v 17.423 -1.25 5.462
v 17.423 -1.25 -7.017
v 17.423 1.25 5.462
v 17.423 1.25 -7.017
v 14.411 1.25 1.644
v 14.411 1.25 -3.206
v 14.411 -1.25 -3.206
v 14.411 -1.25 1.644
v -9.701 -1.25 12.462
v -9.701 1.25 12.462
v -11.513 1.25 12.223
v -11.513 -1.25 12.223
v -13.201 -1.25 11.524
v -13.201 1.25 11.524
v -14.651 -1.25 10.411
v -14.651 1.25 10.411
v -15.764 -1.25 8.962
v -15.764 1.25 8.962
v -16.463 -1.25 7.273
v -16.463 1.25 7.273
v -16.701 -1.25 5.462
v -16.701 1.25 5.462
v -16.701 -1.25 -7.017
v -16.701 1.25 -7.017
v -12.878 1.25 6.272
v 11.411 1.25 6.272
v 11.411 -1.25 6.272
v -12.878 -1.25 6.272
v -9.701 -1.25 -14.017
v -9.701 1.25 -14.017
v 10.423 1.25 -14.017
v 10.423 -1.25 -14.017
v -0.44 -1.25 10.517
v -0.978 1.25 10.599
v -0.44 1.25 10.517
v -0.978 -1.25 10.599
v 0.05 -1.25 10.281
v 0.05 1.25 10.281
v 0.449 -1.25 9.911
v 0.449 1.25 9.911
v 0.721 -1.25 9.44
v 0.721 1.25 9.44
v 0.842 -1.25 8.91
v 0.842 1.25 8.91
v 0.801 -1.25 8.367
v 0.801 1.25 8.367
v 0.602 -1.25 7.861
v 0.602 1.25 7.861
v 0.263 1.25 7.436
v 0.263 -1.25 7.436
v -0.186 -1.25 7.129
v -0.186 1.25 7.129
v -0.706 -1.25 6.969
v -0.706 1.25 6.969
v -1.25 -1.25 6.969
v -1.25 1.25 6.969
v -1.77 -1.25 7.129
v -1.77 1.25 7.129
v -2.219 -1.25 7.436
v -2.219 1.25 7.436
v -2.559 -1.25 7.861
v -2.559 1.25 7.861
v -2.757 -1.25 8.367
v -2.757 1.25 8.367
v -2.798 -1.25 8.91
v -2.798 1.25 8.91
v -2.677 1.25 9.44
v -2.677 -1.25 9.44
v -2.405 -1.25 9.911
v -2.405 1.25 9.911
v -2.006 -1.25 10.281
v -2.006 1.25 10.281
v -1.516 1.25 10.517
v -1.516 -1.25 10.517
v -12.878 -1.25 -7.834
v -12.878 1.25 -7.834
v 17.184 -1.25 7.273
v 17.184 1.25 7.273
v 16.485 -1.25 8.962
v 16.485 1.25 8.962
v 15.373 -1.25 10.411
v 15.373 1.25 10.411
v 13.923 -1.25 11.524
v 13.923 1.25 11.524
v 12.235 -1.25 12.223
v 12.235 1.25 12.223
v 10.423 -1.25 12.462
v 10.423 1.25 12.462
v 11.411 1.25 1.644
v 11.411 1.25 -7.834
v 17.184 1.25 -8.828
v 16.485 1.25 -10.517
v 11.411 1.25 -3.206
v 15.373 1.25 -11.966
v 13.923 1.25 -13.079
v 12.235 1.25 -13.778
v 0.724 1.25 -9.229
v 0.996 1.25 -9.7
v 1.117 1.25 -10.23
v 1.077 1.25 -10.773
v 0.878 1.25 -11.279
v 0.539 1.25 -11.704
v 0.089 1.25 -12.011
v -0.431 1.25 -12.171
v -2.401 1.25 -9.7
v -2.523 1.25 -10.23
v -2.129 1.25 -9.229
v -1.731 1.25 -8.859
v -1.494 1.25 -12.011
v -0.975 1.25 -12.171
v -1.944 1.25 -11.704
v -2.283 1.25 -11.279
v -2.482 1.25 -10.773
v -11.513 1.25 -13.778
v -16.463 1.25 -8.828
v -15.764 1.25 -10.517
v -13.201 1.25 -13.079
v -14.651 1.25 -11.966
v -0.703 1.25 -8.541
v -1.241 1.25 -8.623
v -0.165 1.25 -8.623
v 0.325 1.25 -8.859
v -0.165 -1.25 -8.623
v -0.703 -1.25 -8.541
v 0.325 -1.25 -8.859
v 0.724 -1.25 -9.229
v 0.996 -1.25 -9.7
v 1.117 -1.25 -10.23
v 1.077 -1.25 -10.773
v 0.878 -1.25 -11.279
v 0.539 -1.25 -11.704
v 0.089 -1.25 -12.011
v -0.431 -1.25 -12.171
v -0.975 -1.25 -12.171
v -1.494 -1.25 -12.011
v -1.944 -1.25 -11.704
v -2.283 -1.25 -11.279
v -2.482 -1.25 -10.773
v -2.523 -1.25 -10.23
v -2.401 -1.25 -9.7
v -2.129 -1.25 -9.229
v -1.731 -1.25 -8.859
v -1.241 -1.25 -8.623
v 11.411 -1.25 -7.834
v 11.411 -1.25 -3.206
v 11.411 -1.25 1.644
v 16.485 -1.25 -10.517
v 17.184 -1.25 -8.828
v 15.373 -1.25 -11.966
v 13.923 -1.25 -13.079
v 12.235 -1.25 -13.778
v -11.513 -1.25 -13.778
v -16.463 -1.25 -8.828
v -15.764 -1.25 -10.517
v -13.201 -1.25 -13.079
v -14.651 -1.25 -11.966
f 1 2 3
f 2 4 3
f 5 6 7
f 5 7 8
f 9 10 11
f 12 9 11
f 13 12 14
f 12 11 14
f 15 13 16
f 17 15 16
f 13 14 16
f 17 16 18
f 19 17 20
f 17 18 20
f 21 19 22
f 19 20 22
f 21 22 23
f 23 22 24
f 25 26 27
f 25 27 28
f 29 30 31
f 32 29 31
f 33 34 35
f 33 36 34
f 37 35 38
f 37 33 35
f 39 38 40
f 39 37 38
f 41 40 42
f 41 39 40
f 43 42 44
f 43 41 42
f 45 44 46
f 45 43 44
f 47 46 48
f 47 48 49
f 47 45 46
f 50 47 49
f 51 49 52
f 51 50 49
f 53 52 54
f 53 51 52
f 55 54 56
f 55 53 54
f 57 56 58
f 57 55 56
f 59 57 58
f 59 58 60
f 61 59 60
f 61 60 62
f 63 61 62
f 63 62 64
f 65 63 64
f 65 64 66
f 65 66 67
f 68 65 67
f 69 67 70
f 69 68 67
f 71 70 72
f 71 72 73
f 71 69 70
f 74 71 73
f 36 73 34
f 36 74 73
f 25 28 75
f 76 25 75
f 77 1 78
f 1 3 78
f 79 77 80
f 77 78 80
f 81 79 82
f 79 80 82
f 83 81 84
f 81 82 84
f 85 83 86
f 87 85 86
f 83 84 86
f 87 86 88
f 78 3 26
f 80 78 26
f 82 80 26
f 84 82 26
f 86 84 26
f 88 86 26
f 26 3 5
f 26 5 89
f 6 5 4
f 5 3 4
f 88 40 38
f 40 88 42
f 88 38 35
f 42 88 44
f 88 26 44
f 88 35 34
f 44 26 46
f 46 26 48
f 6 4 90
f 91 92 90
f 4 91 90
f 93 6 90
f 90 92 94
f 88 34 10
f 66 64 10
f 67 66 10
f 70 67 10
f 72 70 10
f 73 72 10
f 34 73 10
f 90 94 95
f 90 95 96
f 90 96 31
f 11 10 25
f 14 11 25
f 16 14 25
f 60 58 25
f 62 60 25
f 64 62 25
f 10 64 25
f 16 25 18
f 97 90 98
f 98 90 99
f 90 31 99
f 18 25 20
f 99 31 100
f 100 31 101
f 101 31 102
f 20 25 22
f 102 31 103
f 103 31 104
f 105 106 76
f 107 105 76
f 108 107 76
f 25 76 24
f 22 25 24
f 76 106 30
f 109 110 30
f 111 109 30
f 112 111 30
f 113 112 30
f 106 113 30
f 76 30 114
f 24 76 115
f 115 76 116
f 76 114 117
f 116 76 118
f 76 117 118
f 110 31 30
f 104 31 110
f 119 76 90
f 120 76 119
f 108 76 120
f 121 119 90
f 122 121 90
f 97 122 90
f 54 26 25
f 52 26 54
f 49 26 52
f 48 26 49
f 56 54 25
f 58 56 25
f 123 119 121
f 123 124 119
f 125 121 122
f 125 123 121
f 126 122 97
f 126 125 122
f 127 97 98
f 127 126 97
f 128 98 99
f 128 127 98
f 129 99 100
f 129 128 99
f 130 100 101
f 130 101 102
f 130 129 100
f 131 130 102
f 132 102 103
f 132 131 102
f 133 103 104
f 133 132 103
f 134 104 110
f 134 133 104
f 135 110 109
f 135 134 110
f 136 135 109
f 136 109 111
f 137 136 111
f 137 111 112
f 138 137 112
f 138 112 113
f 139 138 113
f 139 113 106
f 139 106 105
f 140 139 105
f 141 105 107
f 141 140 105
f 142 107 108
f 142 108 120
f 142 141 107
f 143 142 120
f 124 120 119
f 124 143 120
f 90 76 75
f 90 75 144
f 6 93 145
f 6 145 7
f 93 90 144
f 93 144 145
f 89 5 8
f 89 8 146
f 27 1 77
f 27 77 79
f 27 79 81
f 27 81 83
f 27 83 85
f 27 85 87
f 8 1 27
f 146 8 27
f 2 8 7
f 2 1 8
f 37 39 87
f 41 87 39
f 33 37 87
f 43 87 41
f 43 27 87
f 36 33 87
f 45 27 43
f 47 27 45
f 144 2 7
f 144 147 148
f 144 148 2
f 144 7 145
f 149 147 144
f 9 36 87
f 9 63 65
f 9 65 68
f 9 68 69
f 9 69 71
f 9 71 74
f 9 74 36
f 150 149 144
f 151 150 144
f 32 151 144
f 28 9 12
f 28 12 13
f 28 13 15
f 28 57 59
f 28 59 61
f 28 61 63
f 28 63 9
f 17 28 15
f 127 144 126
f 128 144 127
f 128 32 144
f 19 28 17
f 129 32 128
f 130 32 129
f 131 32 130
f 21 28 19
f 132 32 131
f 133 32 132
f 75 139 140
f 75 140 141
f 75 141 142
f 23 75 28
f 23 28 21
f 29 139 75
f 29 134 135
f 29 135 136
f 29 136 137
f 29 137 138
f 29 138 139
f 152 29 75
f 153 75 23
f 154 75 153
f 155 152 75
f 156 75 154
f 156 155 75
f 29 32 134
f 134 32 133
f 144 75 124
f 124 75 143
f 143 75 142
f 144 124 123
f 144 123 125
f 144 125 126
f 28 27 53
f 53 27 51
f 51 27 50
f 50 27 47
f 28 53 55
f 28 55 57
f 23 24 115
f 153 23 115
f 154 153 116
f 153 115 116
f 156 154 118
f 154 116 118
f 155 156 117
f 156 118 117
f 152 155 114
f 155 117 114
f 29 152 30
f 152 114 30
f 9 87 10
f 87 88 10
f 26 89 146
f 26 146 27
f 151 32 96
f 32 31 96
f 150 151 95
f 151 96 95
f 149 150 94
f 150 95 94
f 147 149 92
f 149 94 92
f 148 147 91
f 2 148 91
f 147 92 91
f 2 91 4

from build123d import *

# Parameters (mm, degrees)
SKETCH2_R           = 1.825
BOSS_EXTRUDE1_DEPTH = 1.25


with BuildPart() as part:
    # Sketch2 → Boss-Extrude1 (new, symmetric)
    with BuildSketch(Plane(origin=(0, 0, 0), x_dir=(1, 0, 0), z_dir=(0, 1, 0))):
        with BuildLine():
            Line((-9.701491638, 14.016578985), (10.422938362, 14.016578985))
            ThreePointArc((10.422938362, 14.016578985), (15.37268583, 11.966326454), (17.422938362, 7.016578985))
            Line((17.422938362, 7.016578985), (17.422938362, -5.461573784))
            ThreePointArc((17.422938362, -5.461573784), (15.37268583, -10.411321253), (10.422938362, -12.461573784))
            Line((10.422938362, -12.461573784), (-9.701491638, -12.461573784))
            ThreePointArc((-9.701491638, -12.461573784), (-14.651239107, -10.411321253), (-16.701491638, -5.461573784))
            Line((-16.701491638, -5.461573784), (-16.701491638, 7.016578985))
            ThreePointArc((-16.701491638, 7.016578985), (-14.651239107, 11.966326454), (-9.701491638, 14.016578985))
        make_face()
        with Locations(Location((-0.702610465, 10.366481865, 0), (0, 0, 270))):
            Circle(SKETCH2_R, mode=Mode.SUBTRACT)
        with Locations(Location((-0.97805, -8.773518135, 0), (0, 0, 270))):
            Circle(SKETCH2_R, mode=Mode.SUBTRACT)
        Polygon((-12.878350873, 7.83354898), (11.411239127, 7.83354898), (11.411239127, 3.2058826), (14.411239127, 3.2058826), (14.411239127, -1.6439074), (11.411239127, -1.6439074), (11.411239127, -6.27157378), (-12.878350873, -6.27157378), align=None, mode=Mode.SUBTRACT)
    extrude(amount=BOSS_EXTRUDE1_DEPTH, both=True)


solid = part.part
